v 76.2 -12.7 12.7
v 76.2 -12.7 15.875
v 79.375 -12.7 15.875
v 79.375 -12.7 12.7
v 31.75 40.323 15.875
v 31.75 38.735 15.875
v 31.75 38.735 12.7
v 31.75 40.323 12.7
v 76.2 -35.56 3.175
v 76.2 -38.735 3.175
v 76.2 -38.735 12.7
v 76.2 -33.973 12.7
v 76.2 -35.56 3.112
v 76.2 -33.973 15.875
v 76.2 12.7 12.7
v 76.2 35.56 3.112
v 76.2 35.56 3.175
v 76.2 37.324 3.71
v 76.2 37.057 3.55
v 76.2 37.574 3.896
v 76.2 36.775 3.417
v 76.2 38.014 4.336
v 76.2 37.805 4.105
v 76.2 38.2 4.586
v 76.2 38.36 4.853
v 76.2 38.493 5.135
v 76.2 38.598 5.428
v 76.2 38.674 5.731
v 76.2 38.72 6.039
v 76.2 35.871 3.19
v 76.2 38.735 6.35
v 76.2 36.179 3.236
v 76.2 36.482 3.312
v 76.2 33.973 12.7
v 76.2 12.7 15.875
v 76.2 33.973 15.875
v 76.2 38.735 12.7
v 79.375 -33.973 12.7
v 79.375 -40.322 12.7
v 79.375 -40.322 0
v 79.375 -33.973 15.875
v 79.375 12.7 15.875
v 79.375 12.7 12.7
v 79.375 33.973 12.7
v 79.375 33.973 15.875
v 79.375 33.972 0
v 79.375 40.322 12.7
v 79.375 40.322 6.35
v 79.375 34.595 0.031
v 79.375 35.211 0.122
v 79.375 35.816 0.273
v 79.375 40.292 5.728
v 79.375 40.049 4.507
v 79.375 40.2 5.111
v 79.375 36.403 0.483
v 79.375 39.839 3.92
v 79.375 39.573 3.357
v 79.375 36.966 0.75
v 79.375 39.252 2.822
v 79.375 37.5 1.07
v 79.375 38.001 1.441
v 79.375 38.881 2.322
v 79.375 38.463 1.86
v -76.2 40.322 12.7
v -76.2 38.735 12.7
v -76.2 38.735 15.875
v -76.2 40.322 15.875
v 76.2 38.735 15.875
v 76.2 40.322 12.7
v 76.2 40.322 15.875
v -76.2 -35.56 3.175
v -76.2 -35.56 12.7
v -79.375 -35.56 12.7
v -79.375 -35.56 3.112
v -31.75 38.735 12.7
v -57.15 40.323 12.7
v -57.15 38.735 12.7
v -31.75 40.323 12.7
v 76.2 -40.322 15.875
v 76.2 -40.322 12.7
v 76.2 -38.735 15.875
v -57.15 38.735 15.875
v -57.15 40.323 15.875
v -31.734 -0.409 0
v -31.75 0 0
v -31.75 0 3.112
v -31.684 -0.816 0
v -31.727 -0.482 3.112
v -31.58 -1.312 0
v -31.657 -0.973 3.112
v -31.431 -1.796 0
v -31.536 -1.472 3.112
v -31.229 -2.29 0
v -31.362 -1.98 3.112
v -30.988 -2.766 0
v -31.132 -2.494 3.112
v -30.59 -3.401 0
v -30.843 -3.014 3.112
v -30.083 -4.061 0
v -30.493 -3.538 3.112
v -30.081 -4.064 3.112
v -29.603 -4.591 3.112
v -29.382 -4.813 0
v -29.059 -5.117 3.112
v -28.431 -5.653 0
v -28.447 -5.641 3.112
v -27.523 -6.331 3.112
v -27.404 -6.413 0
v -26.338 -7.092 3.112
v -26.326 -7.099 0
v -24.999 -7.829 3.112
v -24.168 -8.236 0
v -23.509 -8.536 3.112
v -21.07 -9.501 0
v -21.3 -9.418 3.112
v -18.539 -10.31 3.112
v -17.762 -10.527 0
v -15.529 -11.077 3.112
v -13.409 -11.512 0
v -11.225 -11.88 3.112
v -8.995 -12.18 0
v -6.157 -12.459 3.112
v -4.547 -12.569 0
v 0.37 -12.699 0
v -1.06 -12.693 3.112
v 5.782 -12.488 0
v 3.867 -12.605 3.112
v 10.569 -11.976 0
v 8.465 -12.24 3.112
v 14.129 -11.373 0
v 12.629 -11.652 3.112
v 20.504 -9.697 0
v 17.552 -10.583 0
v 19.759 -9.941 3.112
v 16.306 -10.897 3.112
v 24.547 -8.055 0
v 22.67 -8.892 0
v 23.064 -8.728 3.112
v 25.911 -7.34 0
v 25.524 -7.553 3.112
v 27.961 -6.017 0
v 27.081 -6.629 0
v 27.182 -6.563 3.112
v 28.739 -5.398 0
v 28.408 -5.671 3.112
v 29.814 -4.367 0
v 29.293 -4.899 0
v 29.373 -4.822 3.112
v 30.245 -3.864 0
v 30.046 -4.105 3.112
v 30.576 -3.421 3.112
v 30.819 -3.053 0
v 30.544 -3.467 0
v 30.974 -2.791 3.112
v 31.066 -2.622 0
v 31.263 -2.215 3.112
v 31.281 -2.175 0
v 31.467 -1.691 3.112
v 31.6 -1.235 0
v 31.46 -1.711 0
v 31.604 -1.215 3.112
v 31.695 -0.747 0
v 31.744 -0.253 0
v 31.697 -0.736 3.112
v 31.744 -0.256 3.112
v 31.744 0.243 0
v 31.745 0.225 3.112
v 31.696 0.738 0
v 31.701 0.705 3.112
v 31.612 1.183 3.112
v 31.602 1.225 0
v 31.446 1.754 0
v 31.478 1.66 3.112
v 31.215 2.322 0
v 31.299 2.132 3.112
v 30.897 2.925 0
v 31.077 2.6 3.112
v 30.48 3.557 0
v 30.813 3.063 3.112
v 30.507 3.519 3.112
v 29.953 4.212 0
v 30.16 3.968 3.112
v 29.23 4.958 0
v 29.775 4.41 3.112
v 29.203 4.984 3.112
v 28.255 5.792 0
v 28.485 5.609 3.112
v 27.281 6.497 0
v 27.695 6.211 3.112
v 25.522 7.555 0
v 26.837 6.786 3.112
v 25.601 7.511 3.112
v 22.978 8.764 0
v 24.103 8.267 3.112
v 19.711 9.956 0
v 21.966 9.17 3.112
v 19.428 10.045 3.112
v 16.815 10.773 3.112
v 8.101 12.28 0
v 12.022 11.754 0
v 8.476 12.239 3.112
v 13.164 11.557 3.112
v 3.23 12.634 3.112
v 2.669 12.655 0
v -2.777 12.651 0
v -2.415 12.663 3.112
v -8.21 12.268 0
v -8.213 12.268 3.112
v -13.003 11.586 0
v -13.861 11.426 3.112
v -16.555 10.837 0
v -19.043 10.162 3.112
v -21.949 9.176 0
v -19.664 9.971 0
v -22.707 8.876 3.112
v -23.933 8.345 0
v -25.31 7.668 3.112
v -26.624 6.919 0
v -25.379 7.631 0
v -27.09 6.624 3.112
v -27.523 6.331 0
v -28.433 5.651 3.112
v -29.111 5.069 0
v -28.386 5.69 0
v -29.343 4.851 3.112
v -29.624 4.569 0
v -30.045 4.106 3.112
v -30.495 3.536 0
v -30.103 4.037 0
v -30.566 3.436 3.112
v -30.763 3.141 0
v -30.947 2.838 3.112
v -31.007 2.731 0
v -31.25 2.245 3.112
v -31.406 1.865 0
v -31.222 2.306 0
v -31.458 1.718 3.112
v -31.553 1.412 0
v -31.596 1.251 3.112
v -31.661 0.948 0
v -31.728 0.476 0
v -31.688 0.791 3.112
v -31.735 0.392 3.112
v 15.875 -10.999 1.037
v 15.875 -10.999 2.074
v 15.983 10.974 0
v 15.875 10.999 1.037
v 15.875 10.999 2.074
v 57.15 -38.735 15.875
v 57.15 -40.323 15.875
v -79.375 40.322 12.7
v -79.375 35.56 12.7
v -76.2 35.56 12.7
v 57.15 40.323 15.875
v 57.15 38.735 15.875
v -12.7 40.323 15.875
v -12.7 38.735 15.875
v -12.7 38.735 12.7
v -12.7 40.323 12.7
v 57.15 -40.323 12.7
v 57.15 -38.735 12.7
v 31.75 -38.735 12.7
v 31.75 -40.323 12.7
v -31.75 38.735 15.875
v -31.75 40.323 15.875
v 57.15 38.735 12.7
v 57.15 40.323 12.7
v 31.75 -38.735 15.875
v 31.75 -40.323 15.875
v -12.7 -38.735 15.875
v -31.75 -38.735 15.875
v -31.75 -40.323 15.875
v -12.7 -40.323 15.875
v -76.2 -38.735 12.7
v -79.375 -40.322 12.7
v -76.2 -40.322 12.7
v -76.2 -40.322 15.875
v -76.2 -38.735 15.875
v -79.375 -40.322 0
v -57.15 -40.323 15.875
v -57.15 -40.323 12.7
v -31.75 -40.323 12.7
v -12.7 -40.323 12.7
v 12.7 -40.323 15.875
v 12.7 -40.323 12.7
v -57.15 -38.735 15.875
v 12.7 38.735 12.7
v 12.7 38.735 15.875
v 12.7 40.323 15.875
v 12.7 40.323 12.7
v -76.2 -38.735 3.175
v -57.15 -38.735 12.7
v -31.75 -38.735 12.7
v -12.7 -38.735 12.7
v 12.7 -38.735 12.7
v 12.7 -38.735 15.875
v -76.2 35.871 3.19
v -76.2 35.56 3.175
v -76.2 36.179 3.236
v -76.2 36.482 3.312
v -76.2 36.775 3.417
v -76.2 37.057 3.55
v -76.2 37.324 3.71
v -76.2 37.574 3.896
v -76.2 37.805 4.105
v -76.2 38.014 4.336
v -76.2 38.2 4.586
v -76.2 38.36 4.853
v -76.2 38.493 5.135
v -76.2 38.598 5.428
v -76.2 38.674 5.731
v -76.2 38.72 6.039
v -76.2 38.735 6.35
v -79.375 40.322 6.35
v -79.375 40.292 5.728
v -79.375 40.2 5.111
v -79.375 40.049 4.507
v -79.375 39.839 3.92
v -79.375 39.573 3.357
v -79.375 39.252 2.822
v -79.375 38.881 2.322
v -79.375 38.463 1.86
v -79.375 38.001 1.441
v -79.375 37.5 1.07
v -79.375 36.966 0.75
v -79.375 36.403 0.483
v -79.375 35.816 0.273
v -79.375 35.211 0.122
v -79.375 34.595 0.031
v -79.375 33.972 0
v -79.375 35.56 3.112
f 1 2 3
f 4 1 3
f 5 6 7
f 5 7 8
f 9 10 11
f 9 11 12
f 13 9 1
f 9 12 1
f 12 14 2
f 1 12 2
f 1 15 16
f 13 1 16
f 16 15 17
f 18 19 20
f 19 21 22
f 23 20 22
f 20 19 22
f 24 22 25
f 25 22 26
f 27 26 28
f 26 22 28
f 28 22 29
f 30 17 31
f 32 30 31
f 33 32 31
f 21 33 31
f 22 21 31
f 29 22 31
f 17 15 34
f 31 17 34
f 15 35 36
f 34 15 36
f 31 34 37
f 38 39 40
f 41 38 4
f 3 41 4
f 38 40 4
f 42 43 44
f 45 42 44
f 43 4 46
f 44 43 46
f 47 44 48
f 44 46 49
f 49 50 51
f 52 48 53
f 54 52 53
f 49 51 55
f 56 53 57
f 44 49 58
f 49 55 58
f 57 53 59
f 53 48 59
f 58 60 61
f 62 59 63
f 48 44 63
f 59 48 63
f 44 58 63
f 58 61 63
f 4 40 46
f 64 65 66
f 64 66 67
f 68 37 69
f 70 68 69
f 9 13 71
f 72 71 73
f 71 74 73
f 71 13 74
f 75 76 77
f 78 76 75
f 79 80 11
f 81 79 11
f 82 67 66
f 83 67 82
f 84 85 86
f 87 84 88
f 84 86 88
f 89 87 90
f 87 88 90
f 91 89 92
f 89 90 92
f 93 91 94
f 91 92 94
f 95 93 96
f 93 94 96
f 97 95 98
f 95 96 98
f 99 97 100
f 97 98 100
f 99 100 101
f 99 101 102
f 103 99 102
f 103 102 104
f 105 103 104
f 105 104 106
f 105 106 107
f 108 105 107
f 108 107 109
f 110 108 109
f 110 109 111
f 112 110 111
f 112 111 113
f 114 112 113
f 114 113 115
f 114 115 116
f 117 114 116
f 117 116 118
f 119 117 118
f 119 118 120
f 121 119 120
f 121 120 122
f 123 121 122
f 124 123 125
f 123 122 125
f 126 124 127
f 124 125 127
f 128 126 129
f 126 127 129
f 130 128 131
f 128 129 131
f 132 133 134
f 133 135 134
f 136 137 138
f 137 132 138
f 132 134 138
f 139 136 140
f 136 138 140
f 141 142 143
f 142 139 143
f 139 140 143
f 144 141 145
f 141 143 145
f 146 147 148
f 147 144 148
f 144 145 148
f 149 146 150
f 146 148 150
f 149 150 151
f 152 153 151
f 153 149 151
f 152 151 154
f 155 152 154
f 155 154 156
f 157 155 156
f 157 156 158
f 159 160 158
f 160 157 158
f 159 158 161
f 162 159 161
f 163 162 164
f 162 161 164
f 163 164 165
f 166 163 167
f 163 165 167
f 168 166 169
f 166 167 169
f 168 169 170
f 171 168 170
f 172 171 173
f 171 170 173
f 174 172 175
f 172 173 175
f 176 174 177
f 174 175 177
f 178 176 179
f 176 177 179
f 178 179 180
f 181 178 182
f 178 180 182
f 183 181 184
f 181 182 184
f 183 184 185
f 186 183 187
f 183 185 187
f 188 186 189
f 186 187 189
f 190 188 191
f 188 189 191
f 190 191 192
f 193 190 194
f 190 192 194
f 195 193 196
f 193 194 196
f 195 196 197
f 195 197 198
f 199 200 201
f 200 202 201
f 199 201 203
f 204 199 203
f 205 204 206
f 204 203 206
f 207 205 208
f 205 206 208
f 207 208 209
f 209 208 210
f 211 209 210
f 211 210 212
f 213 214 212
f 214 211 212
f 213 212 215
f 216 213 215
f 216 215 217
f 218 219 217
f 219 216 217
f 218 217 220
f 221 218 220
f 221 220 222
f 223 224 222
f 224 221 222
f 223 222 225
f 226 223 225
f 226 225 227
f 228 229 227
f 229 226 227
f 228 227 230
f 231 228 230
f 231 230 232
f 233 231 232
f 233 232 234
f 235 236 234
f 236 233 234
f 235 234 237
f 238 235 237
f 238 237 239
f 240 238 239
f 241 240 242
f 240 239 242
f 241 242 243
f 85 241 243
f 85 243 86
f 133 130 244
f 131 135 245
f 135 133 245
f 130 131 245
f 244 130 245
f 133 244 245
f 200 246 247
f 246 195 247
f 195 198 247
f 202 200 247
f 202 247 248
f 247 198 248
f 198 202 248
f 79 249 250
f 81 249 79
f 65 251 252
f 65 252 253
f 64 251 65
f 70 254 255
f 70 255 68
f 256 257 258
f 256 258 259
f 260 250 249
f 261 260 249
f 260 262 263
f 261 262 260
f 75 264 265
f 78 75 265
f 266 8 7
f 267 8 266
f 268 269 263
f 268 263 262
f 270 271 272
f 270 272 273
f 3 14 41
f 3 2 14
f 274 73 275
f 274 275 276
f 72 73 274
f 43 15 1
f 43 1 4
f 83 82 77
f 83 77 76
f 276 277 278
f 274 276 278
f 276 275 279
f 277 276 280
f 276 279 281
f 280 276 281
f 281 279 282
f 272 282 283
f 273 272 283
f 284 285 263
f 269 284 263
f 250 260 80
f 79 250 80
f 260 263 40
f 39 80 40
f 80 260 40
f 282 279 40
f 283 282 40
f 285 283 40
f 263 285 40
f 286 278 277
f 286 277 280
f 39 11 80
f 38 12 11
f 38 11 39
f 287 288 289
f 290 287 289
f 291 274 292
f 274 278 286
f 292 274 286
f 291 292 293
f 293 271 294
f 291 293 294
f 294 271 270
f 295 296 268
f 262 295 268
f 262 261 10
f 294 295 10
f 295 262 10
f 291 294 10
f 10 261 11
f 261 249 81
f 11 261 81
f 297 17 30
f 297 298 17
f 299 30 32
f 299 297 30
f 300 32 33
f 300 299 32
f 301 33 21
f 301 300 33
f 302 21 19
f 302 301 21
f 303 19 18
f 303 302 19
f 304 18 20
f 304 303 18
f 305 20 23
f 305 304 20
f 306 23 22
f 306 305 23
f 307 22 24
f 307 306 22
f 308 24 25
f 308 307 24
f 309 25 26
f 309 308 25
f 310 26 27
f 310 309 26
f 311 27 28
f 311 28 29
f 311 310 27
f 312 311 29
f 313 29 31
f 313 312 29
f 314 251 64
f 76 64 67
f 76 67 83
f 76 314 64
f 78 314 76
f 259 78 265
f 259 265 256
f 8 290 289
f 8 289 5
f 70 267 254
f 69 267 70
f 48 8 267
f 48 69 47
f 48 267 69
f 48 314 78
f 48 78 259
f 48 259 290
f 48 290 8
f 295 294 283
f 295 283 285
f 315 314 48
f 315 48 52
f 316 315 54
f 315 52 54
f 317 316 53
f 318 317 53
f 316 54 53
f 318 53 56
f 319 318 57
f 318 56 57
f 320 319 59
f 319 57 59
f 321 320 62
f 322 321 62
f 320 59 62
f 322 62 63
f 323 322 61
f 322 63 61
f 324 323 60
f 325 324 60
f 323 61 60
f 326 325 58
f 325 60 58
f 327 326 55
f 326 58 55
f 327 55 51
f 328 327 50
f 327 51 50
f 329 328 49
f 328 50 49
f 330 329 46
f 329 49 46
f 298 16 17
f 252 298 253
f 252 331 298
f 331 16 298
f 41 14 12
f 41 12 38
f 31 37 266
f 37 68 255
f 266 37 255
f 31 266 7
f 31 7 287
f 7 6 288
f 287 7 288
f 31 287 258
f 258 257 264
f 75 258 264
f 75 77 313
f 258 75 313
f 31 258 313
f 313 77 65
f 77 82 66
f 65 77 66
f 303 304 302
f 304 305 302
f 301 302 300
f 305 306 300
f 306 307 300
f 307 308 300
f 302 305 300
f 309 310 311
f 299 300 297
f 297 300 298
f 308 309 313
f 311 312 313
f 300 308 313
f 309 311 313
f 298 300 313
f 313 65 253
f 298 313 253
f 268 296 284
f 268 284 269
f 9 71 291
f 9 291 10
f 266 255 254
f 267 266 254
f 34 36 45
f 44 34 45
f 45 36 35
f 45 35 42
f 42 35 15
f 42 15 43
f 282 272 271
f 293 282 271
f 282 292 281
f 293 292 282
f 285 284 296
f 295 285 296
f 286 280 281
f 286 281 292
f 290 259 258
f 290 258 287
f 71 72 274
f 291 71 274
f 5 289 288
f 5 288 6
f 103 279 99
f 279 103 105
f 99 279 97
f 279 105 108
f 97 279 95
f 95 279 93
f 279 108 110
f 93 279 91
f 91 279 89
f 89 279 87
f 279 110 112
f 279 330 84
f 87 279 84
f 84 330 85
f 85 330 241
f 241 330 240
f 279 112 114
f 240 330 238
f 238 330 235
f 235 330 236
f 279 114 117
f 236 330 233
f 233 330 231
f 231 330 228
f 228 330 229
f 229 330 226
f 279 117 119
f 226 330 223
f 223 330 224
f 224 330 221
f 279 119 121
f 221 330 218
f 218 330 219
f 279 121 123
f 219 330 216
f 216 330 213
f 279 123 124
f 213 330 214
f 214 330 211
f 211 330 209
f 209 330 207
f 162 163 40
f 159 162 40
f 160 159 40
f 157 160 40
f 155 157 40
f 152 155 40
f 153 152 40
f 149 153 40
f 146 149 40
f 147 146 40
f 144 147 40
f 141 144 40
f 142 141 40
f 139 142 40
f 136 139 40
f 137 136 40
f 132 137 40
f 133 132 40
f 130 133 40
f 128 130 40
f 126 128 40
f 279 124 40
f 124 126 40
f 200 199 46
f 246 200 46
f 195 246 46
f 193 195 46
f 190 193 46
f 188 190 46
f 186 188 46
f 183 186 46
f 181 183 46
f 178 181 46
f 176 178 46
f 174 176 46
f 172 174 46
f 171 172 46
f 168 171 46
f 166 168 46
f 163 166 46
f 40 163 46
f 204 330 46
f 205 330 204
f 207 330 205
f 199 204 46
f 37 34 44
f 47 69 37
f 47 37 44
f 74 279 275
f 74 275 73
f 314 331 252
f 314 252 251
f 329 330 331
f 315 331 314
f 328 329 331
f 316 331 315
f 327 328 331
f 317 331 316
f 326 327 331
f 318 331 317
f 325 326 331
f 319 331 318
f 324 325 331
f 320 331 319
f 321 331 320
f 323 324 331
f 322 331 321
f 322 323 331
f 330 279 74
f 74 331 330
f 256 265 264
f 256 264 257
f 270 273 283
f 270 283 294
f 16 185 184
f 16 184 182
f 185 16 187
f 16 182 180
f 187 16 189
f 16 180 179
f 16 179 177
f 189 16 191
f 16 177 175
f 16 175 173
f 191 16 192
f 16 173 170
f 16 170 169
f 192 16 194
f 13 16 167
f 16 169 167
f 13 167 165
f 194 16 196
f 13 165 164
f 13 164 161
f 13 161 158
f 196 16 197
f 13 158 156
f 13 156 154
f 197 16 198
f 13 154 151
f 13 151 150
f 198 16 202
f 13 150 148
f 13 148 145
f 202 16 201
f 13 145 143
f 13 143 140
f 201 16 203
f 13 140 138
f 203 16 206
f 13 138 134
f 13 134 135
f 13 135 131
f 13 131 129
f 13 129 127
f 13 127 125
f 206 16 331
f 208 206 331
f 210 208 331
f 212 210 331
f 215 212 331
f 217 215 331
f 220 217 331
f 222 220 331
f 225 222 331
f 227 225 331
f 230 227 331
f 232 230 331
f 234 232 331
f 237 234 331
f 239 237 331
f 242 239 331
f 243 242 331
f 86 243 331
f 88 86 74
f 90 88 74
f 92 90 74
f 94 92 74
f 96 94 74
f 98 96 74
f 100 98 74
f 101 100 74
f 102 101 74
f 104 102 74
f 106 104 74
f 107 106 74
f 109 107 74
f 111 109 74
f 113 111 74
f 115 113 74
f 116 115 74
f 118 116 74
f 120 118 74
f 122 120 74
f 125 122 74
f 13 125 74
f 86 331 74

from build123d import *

# Parameters (mm, degrees)
F0_W     = 158.75
F0_H     = 80.645
F1_DEPTH = 15.875
F2_W     = 71.12
F2_H     = 9.652
F3_DEPTH = 155.575
F5_DEPTH = 12.7
F6_W     = 3.175
F6_H     = 40.3225
F6_W_2   = 25.4
F6_H_2   = 1.5875
F6_H_3   = 6.35
F6_H_4   = 25.4
F7_DEPTH = 3.175
F9_DEPTH = 25.4
F10_R    = 3.17499
F11_R    = 6.35


# Not quite as in the source:
# - a fillet or chamfer is up to 0.001 mm smaller than in the source, because OpenCascade refuses the exact size


with BuildPart() as f1:
    # F0 (on Top) → F1 (new body)
    with BuildSketch(Plane.XY):
        Rectangle(F0_W, F0_H)
    extrude(amount=F1_DEPTH)

    # F2 (on face) → F3 (cut)
    with BuildSketch(Plane(origin=(-79.375, 0, 0), x_dir=(0, -1, 0), z_dir=(-1, 0, 0))):
        with Locations((0, 7.9375)):
            Rectangle(F2_W, F2_H)
    extrude(amount=-F3_DEPTH, mode=Mode.SUBTRACT)

    # F4 (on face) → F5 (cut)
    with BuildSketch(Plane.XY.offset(15.875)):
        Polygon((76.2, 38.735), (-76.2, 38.735), (-76.2, 0), (-76.2, -38.735), (76.2, -38.735), align=None)
    extrude(amount=-F5_DEPTH, mode=Mode.SUBTRACT)

    # F6 (on face) → F7 (cut)
    with BuildSketch(Plane.XY.offset(15.875)):
        with Locations((-77.7875, -20.16125)):
            Rectangle(F6_W, F6_H)
        with Locations((-77.7875, 20.16125)):
            Rectangle(F6_W, F6_H)
        with Locations((-44.45, -39.52875)):
            Rectangle(F6_W_2, F6_H_2)
        with Locations((0, -39.52875)):
            Rectangle(F6_W_2, F6_H_2)
        with Locations((44.45, -39.52875)):
            Rectangle(F6_W_2, F6_H_2)
        with Locations((-44.45, 39.52875)):
            Rectangle(F6_W_2, F6_H_2)
        with Locations((0, 39.52875)):
            Rectangle(F6_W_2, F6_H_2)
        with Locations((44.45, 39.52875)):
            Rectangle(F6_W_2, F6_H_2)
        with Locations((77.7875, 37.1475)):
            Rectangle(F6_W, F6_H_3)
        with Locations((77.7875, -37.1475)):
            Rectangle(F6_W, F6_H_3)
        with Locations((77.7875, 0)):
            Rectangle(F6_W, F6_H_4)
    extrude(amount=-F7_DEPTH, mode=Mode.SUBTRACT)

    # F8 (on face) → F9 (cut)
    with BuildSketch(Plane.XY.offset(3.1115)):
        with BuildLine():
            add(Edge.make_bspline(
                [(-31.75, 0), (-31.75, -21.9970452561), (15.875, -10.9985226281), (63.5, 0), (15.875, 10.9985226281), (-31.75, 21.9970452561), (-31.75, 0)],
                knots=[0, 0, 0, 2.0943951024, 2.0943951024, 4.1887902048, 4.1887902048, 6.2831853072, 6.2831853072, 6.2831853072], degree=2, weights=[1, 0.5, 1, 0.5, 1, 0.5, 1]))
        make_face()
    extrude(amount=-F9_DEPTH, mode=Mode.SUBTRACT)

    # F10 (radius 3.175 in the source; OpenCascade refuses exactly that, so slightly less here)
    f10_edges = [f1.edges().sort_by_distance(p)[0] for p in [
        (0, 38.735, 3.175),
    ]]
    fillet(f10_edges, radius=F10_R)

    # F11
    f11_edges = [f1.edges().sort_by_distance(p)[0] for p in [
        (0, 40.3225, 0),
    ]]
    fillet(f11_edges, radius=F11_R)


solid = f1.part
